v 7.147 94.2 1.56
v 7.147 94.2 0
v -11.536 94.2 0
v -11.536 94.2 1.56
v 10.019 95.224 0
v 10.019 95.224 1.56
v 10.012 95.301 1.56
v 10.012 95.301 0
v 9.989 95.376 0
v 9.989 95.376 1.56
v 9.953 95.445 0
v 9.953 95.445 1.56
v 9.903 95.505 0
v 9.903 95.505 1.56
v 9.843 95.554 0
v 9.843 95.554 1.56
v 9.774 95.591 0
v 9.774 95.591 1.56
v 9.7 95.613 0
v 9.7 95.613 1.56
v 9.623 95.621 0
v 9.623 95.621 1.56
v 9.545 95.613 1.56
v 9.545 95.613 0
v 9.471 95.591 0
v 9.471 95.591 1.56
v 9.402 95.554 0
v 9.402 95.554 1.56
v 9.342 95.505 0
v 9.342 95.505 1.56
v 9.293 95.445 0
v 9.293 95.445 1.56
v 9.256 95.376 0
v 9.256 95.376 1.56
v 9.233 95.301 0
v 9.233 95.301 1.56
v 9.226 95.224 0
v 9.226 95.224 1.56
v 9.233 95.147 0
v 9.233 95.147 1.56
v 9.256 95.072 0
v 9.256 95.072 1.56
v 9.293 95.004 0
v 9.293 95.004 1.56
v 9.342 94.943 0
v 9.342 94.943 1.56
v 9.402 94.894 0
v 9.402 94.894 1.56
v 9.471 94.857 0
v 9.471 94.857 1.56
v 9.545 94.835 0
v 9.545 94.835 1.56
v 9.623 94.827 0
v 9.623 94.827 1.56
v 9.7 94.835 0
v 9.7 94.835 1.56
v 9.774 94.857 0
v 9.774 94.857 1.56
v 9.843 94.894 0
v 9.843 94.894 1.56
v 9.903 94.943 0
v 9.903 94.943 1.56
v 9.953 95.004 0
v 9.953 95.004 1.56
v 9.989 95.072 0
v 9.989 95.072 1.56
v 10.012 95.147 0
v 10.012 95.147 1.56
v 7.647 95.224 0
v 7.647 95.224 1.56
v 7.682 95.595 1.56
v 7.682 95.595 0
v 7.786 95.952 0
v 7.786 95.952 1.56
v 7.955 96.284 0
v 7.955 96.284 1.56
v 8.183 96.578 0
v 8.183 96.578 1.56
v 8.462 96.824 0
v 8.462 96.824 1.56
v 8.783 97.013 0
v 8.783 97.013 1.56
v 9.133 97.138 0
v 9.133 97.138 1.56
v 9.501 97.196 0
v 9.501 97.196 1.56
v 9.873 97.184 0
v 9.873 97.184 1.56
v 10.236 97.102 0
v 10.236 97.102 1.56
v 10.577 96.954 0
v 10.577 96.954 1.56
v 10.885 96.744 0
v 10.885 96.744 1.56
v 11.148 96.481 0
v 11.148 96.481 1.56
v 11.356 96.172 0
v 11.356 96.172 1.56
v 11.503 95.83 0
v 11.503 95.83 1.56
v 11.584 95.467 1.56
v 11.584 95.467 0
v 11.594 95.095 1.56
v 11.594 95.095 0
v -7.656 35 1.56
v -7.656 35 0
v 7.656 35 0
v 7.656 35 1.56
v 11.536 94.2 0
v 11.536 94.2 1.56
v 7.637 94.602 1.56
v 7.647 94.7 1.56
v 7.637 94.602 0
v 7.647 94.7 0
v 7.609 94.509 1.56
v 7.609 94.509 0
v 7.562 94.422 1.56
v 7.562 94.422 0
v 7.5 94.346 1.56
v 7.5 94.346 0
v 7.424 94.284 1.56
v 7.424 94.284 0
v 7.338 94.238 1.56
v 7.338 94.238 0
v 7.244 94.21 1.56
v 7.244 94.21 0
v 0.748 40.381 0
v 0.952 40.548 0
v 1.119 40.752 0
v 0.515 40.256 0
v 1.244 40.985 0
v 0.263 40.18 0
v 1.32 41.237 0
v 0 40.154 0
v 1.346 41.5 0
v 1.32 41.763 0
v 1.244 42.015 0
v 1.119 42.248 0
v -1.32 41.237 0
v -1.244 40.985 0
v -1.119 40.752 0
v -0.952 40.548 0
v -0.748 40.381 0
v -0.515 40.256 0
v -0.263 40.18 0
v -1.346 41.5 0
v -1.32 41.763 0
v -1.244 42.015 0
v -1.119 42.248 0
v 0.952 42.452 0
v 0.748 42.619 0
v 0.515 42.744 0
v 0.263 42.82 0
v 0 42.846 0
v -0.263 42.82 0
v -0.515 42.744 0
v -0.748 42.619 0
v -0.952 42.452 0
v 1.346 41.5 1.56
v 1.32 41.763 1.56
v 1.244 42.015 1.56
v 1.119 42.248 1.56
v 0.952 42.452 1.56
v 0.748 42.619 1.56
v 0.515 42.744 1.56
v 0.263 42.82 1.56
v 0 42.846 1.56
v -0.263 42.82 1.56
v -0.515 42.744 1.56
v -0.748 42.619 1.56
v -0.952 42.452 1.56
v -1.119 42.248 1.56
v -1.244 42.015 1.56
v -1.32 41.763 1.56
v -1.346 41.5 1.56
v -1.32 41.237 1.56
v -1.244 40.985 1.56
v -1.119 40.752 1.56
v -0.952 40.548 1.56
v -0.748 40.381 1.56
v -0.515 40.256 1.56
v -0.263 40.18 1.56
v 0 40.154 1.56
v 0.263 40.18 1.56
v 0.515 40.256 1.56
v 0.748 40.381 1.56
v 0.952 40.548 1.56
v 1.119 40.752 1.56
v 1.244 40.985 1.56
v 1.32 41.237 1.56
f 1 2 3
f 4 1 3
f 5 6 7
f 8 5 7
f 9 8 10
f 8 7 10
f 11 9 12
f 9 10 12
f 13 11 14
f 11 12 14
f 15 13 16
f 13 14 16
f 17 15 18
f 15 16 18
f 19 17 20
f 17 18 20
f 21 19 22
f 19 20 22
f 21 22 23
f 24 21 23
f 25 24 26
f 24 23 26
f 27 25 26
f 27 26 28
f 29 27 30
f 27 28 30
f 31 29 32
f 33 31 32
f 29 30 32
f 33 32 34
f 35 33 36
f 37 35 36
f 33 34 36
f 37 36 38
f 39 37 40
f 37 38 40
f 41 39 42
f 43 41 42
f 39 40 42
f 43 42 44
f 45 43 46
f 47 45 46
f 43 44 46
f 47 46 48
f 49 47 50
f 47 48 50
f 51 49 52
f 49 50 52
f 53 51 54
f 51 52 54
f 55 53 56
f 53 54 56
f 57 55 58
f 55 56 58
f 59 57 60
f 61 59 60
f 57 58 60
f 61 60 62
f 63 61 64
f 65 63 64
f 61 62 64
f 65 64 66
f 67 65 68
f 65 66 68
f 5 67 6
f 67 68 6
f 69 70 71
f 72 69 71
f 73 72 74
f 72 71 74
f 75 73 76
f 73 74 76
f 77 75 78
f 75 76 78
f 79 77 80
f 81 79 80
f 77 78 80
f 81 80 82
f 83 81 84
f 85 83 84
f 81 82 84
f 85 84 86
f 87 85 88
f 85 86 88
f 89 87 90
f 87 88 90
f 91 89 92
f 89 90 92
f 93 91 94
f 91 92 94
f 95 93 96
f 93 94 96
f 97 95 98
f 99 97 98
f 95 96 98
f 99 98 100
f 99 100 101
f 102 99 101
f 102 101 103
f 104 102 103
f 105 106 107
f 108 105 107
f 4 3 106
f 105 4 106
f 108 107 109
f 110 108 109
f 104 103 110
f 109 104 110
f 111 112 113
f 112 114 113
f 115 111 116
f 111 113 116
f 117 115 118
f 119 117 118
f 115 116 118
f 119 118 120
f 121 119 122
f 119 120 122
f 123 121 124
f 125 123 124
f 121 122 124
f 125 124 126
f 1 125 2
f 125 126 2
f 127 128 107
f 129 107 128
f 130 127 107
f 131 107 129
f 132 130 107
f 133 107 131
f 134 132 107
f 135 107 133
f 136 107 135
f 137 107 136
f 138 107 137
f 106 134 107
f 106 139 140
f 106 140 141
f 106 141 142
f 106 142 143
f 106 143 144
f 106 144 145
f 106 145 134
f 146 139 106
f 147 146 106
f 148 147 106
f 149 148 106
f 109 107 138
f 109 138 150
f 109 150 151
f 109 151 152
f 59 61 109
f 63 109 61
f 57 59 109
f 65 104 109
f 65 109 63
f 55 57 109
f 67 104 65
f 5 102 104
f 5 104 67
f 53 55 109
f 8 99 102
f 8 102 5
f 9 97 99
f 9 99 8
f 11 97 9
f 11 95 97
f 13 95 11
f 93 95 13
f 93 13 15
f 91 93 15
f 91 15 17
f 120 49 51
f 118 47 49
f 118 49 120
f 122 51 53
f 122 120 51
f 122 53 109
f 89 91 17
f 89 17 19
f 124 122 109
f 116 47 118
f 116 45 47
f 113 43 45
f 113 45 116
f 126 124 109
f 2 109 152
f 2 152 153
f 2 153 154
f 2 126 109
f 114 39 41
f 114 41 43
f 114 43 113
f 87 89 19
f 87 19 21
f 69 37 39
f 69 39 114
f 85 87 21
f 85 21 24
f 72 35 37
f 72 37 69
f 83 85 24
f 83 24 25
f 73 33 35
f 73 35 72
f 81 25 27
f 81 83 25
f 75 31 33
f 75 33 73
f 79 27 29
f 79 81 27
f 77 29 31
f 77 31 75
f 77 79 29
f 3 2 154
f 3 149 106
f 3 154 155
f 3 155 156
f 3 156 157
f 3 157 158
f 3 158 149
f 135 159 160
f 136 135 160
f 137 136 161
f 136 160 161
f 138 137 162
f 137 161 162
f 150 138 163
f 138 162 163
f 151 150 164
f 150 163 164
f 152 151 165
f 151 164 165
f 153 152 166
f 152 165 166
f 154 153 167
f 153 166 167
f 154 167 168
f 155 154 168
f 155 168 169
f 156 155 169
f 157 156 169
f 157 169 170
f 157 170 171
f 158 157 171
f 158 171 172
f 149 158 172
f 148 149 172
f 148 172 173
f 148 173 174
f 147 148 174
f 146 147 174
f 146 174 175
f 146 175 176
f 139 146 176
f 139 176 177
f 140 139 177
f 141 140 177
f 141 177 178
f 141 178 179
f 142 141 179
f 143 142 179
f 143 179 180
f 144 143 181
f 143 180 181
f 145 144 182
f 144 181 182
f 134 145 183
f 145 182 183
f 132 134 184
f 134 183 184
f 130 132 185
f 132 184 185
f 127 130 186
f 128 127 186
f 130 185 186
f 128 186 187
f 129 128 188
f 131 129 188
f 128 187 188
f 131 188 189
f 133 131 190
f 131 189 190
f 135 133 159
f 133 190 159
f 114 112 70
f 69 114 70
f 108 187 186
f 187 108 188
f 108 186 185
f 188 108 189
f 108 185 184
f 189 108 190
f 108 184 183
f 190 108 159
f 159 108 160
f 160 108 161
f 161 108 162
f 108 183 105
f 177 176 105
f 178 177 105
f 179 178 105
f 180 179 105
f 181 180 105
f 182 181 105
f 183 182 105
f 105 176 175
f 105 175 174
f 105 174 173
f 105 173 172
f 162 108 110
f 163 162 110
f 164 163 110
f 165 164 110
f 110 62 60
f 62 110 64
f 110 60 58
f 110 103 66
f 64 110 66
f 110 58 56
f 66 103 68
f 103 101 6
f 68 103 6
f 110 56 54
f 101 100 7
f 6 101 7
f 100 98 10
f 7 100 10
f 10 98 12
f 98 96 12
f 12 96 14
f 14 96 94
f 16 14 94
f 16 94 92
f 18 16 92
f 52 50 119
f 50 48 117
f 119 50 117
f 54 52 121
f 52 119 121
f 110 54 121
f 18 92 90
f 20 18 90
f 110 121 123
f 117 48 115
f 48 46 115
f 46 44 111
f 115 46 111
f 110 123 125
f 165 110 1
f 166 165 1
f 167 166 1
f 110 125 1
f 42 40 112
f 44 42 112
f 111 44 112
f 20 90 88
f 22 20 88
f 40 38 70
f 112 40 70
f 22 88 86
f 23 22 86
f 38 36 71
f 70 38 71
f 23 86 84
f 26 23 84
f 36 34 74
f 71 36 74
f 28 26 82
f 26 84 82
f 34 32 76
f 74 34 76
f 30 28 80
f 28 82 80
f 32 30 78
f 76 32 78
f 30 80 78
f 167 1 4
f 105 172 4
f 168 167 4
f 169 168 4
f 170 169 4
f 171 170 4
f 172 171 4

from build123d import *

# Parameters (mm, degrees)
EXTRUDE1_DEPTH     = 1.56
SKETCH2_R          = 1.3462
CUT_EXTRUDE2_DEPTH = 2.56
SKETCH3_R          = 0.396875
EXTRUDE2_DEPTH     = 1.56
FILLET1_R          = 0.5


with BuildPart() as part:
    # Sketch1 → Extrude1 (new body)
    with BuildSketch(Plane.XY):
        Polygon((-7.655500535, 35), (7.655500535, 35), (11.535673534, 94.2), (-11.535673534, 94.2), align=None)
    extrude(amount=EXTRUDE1_DEPTH)

    # Sketch2 → Cut-Extrude2 (cut, through all)
    with BuildSketch(Plane(origin=(2.513247729, -24.95744912, 1.56), x_dir=(1, 0, 0), z_dir=(0, 0, 1))):
        with Locations((-2.513247729, 66.45744912)):
            Circle(SKETCH2_R)
    extrude(amount=-CUT_EXTRUDE2_DEPTH, mode=Mode.SUBTRACT)

    # Sketch3 → Extrude2 (add)
    with BuildSketch(Plane.XY.offset(1.56)):
        with BuildLine():
            Line((11.535673534, 94.2), (7.646607283, 94.2))
            Line((7.646607283, 94.2), (7.646607283, 95.22402761))
            ThreePointArc((7.646607283, 95.22402761), (9.687231677, 97.19894204), (11.594321354, 95.094792832))
            Line((11.594321354, 95.094792832), (11.535673534, 94.2))
        make_face()
        with Locations((9.622579673, 95.22402761)):
            Circle(SKETCH3_R, mode=Mode.SUBTRACT)
    extrude(amount=-EXTRUDE2_DEPTH)

    # Fillet1
    fillet1_edges = [part.edges().sort_by_distance(p)[0] for p in [
        (7.646607283, 94.2, 0.78),
    ]]
    fillet(fillet1_edges, radius=FILLET1_R)


solid = part.part
